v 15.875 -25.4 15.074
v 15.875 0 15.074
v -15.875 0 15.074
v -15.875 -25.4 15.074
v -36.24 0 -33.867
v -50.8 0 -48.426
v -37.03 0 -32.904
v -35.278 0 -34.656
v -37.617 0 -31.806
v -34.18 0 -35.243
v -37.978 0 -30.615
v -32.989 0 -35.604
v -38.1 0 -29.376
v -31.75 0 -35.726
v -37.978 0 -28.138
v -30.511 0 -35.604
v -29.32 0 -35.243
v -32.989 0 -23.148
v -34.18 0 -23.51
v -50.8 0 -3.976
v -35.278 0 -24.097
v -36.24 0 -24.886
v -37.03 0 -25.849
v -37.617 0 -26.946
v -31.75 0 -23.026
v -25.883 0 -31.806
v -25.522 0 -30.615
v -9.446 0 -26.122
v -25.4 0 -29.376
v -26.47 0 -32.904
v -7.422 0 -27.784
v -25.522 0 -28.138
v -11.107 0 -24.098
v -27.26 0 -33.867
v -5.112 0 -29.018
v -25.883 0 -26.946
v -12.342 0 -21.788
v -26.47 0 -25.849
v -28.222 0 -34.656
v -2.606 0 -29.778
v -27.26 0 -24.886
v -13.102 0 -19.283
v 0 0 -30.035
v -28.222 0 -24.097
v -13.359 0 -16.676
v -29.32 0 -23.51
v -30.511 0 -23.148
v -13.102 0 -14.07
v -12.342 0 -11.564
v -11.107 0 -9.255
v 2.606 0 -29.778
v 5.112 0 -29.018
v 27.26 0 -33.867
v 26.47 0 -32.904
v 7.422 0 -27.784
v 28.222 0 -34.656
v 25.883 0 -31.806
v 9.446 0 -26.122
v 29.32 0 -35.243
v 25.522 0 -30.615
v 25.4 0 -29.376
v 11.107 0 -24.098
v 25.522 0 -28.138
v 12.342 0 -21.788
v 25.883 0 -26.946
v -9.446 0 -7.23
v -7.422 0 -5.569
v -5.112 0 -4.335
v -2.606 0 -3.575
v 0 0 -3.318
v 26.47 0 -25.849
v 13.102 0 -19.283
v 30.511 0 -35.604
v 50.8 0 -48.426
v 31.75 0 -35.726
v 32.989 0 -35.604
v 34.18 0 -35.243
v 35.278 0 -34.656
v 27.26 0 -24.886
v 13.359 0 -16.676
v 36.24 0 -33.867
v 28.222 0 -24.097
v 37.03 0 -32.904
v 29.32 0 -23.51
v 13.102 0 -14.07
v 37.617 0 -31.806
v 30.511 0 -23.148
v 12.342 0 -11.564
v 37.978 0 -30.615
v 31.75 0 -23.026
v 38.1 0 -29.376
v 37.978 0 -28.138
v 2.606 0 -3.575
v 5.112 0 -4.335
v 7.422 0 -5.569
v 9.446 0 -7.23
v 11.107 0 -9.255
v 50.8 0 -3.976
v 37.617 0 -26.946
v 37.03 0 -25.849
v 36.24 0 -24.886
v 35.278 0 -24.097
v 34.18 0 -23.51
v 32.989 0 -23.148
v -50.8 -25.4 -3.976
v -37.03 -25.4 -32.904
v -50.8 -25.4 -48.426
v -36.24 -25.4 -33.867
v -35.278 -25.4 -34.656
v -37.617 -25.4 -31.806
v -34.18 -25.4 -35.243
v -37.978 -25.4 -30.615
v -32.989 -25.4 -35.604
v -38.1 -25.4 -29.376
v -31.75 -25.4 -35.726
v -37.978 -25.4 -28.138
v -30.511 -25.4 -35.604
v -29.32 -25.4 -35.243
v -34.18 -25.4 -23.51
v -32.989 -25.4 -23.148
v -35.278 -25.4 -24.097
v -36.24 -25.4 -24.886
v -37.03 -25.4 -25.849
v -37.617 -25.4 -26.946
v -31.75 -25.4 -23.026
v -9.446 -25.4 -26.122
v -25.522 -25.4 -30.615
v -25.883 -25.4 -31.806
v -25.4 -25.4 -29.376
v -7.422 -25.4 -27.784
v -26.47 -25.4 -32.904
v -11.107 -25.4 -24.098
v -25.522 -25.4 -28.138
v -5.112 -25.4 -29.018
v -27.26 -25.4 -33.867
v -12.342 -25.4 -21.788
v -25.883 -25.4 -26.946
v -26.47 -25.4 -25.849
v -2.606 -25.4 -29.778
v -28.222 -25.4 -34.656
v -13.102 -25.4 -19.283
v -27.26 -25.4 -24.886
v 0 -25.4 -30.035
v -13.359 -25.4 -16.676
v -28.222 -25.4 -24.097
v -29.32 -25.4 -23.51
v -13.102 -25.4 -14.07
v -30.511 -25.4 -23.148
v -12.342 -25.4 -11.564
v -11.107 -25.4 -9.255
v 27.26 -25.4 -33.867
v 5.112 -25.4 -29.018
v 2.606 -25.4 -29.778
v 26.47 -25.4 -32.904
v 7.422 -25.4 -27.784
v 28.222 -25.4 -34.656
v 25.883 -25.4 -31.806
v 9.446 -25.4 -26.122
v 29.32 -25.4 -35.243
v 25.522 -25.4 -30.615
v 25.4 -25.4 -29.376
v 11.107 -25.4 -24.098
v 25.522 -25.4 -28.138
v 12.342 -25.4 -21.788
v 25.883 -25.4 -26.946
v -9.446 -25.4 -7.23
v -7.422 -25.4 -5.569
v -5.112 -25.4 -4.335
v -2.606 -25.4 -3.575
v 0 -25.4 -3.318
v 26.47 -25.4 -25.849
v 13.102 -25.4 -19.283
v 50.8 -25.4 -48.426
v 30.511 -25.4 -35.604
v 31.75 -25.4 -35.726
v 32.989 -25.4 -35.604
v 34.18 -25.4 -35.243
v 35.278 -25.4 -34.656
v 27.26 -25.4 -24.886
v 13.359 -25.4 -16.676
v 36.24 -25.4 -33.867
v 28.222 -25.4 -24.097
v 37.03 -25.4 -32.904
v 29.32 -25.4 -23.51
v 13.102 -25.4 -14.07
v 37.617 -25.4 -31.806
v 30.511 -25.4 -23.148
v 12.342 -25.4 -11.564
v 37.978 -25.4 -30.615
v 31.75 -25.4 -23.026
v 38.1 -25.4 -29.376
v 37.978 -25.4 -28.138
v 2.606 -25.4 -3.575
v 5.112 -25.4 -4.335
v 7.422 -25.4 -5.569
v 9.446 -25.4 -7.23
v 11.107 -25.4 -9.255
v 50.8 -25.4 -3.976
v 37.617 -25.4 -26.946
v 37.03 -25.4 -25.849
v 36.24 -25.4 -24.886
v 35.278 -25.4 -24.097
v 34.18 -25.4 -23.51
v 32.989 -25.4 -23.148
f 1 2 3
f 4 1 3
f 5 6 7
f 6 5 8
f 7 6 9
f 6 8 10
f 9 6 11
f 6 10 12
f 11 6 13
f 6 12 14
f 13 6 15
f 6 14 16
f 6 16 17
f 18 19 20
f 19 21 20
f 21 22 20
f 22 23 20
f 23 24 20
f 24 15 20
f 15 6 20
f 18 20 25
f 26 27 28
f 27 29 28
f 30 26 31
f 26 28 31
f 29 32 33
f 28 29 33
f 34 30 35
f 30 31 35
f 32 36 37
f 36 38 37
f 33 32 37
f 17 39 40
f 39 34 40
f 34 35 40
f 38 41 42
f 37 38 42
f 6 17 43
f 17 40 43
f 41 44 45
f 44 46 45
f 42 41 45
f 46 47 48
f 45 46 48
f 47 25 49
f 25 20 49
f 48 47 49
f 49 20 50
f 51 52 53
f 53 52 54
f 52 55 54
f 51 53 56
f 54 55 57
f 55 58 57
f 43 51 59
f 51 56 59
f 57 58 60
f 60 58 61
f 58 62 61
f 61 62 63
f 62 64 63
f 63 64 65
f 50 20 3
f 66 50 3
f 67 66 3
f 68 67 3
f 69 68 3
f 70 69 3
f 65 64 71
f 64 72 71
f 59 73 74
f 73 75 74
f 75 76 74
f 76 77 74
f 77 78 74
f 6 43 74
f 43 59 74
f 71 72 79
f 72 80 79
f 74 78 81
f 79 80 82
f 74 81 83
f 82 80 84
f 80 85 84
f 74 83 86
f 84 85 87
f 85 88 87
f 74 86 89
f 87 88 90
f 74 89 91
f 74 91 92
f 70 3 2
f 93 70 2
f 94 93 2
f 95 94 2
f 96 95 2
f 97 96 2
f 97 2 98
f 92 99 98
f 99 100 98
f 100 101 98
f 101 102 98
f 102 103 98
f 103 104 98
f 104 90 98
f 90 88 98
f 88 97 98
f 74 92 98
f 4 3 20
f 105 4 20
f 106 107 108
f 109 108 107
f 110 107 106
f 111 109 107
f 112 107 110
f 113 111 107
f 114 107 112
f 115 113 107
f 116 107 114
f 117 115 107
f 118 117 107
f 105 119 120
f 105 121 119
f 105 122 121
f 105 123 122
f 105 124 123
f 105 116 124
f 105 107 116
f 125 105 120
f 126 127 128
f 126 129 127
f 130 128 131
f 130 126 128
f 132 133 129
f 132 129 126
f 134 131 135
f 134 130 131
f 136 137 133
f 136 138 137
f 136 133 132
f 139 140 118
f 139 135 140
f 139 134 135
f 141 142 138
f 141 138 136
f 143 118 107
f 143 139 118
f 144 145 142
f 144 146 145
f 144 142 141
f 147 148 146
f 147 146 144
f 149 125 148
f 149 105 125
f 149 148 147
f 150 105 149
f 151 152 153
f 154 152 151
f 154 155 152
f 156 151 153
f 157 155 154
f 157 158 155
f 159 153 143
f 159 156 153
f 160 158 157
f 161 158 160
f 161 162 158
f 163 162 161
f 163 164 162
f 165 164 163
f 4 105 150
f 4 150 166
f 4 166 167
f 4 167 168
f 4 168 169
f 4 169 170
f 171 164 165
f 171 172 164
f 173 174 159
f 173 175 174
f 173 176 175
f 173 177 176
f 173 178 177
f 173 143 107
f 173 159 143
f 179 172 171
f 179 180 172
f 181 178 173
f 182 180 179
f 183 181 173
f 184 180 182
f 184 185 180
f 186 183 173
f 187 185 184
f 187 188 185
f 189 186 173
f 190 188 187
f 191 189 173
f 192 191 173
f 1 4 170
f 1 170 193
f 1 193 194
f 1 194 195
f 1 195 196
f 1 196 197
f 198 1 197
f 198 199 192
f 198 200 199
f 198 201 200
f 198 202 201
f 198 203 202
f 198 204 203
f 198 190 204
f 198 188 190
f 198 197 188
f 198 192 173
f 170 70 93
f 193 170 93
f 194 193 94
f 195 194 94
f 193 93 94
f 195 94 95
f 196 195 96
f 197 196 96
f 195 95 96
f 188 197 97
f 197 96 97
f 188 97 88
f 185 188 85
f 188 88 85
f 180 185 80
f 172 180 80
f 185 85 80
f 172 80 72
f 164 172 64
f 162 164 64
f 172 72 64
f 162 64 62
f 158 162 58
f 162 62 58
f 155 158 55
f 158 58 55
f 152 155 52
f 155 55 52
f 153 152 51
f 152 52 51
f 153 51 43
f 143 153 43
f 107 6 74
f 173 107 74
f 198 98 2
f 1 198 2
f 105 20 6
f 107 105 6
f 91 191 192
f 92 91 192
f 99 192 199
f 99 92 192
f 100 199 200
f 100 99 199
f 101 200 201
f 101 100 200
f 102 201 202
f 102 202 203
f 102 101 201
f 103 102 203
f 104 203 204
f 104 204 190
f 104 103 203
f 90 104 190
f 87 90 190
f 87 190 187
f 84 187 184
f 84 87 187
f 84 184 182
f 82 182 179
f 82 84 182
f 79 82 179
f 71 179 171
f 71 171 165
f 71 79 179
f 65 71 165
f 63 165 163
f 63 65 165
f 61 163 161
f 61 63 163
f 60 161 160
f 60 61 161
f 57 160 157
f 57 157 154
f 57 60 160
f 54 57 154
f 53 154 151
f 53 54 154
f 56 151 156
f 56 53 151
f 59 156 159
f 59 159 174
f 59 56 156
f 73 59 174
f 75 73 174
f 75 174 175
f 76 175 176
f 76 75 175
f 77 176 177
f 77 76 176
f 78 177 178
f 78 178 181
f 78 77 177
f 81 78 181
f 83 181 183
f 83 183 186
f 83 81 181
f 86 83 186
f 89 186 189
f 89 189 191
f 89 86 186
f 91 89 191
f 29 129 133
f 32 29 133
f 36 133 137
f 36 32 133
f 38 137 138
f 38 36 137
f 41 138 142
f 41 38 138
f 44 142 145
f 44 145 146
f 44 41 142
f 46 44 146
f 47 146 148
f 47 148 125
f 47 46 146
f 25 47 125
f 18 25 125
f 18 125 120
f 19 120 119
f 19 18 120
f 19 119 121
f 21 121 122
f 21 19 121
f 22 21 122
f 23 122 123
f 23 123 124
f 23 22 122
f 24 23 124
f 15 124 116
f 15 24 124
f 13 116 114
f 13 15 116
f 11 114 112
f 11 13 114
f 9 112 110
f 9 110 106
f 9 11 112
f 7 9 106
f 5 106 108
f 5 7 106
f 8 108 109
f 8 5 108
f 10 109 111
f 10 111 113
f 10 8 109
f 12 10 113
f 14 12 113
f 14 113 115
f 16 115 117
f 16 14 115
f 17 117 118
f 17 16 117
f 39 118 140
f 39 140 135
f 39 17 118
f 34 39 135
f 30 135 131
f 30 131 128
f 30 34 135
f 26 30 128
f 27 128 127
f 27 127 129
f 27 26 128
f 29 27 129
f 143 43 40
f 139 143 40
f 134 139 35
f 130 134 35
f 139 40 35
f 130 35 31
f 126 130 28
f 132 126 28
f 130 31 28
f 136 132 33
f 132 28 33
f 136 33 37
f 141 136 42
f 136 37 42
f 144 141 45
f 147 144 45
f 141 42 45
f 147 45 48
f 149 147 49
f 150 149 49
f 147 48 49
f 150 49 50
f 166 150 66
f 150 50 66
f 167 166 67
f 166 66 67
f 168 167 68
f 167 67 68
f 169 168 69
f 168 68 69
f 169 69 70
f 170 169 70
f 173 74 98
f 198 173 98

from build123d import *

# Parameters (mm, degrees)
F0_R     = 6.35
F1_DEPTH = 25.4


with BuildPart() as f1:
    # F0 (on Front) → F1 (new body)
    with BuildSketch(Plane.XZ):
        with BuildLine():
            Line((0, -3.317883), (0, 15.07361))
            Line((0, 15.07361), (-15.875, 15.07361))
            Line((-15.875, 15.07361), (-50.8, -3.97639))
            Line((-50.8, -3.97639), (-50.8, -48.42639))
            Line((-50.8, -48.42639), (0, -48.42639))
            Line((0, -48.42639), (0, -30.034896))
            ThreePointArc((0, -30.034896), (-13.358506, -16.67639), (0, -3.317883))
        make_face()
        with Locations((-31.75, -29.37639)):
            Circle(F0_R, mode=Mode.SUBTRACT)
        with BuildLine():
            Line((15.875, 15.07361), (0, 15.07361))
            Line((0, 15.07361), (0, -3.317883))
            ThreePointArc((0, -3.317883), (13.358506, -16.67639), (0, -30.034896))
            Line((0, -30.034896), (0, -48.42639))
            Line((0, -48.42639), (50.8, -48.42639))
            Line((50.8, -48.42639), (50.8, -3.97639))
            Line((50.8, -3.97639), (15.875, 15.07361))
        make_face()
        with Locations((31.75, -29.37639)):
            Circle(F0_R, mode=Mode.SUBTRACT)
    extrude(amount=F1_DEPTH)


solid = f1.part
